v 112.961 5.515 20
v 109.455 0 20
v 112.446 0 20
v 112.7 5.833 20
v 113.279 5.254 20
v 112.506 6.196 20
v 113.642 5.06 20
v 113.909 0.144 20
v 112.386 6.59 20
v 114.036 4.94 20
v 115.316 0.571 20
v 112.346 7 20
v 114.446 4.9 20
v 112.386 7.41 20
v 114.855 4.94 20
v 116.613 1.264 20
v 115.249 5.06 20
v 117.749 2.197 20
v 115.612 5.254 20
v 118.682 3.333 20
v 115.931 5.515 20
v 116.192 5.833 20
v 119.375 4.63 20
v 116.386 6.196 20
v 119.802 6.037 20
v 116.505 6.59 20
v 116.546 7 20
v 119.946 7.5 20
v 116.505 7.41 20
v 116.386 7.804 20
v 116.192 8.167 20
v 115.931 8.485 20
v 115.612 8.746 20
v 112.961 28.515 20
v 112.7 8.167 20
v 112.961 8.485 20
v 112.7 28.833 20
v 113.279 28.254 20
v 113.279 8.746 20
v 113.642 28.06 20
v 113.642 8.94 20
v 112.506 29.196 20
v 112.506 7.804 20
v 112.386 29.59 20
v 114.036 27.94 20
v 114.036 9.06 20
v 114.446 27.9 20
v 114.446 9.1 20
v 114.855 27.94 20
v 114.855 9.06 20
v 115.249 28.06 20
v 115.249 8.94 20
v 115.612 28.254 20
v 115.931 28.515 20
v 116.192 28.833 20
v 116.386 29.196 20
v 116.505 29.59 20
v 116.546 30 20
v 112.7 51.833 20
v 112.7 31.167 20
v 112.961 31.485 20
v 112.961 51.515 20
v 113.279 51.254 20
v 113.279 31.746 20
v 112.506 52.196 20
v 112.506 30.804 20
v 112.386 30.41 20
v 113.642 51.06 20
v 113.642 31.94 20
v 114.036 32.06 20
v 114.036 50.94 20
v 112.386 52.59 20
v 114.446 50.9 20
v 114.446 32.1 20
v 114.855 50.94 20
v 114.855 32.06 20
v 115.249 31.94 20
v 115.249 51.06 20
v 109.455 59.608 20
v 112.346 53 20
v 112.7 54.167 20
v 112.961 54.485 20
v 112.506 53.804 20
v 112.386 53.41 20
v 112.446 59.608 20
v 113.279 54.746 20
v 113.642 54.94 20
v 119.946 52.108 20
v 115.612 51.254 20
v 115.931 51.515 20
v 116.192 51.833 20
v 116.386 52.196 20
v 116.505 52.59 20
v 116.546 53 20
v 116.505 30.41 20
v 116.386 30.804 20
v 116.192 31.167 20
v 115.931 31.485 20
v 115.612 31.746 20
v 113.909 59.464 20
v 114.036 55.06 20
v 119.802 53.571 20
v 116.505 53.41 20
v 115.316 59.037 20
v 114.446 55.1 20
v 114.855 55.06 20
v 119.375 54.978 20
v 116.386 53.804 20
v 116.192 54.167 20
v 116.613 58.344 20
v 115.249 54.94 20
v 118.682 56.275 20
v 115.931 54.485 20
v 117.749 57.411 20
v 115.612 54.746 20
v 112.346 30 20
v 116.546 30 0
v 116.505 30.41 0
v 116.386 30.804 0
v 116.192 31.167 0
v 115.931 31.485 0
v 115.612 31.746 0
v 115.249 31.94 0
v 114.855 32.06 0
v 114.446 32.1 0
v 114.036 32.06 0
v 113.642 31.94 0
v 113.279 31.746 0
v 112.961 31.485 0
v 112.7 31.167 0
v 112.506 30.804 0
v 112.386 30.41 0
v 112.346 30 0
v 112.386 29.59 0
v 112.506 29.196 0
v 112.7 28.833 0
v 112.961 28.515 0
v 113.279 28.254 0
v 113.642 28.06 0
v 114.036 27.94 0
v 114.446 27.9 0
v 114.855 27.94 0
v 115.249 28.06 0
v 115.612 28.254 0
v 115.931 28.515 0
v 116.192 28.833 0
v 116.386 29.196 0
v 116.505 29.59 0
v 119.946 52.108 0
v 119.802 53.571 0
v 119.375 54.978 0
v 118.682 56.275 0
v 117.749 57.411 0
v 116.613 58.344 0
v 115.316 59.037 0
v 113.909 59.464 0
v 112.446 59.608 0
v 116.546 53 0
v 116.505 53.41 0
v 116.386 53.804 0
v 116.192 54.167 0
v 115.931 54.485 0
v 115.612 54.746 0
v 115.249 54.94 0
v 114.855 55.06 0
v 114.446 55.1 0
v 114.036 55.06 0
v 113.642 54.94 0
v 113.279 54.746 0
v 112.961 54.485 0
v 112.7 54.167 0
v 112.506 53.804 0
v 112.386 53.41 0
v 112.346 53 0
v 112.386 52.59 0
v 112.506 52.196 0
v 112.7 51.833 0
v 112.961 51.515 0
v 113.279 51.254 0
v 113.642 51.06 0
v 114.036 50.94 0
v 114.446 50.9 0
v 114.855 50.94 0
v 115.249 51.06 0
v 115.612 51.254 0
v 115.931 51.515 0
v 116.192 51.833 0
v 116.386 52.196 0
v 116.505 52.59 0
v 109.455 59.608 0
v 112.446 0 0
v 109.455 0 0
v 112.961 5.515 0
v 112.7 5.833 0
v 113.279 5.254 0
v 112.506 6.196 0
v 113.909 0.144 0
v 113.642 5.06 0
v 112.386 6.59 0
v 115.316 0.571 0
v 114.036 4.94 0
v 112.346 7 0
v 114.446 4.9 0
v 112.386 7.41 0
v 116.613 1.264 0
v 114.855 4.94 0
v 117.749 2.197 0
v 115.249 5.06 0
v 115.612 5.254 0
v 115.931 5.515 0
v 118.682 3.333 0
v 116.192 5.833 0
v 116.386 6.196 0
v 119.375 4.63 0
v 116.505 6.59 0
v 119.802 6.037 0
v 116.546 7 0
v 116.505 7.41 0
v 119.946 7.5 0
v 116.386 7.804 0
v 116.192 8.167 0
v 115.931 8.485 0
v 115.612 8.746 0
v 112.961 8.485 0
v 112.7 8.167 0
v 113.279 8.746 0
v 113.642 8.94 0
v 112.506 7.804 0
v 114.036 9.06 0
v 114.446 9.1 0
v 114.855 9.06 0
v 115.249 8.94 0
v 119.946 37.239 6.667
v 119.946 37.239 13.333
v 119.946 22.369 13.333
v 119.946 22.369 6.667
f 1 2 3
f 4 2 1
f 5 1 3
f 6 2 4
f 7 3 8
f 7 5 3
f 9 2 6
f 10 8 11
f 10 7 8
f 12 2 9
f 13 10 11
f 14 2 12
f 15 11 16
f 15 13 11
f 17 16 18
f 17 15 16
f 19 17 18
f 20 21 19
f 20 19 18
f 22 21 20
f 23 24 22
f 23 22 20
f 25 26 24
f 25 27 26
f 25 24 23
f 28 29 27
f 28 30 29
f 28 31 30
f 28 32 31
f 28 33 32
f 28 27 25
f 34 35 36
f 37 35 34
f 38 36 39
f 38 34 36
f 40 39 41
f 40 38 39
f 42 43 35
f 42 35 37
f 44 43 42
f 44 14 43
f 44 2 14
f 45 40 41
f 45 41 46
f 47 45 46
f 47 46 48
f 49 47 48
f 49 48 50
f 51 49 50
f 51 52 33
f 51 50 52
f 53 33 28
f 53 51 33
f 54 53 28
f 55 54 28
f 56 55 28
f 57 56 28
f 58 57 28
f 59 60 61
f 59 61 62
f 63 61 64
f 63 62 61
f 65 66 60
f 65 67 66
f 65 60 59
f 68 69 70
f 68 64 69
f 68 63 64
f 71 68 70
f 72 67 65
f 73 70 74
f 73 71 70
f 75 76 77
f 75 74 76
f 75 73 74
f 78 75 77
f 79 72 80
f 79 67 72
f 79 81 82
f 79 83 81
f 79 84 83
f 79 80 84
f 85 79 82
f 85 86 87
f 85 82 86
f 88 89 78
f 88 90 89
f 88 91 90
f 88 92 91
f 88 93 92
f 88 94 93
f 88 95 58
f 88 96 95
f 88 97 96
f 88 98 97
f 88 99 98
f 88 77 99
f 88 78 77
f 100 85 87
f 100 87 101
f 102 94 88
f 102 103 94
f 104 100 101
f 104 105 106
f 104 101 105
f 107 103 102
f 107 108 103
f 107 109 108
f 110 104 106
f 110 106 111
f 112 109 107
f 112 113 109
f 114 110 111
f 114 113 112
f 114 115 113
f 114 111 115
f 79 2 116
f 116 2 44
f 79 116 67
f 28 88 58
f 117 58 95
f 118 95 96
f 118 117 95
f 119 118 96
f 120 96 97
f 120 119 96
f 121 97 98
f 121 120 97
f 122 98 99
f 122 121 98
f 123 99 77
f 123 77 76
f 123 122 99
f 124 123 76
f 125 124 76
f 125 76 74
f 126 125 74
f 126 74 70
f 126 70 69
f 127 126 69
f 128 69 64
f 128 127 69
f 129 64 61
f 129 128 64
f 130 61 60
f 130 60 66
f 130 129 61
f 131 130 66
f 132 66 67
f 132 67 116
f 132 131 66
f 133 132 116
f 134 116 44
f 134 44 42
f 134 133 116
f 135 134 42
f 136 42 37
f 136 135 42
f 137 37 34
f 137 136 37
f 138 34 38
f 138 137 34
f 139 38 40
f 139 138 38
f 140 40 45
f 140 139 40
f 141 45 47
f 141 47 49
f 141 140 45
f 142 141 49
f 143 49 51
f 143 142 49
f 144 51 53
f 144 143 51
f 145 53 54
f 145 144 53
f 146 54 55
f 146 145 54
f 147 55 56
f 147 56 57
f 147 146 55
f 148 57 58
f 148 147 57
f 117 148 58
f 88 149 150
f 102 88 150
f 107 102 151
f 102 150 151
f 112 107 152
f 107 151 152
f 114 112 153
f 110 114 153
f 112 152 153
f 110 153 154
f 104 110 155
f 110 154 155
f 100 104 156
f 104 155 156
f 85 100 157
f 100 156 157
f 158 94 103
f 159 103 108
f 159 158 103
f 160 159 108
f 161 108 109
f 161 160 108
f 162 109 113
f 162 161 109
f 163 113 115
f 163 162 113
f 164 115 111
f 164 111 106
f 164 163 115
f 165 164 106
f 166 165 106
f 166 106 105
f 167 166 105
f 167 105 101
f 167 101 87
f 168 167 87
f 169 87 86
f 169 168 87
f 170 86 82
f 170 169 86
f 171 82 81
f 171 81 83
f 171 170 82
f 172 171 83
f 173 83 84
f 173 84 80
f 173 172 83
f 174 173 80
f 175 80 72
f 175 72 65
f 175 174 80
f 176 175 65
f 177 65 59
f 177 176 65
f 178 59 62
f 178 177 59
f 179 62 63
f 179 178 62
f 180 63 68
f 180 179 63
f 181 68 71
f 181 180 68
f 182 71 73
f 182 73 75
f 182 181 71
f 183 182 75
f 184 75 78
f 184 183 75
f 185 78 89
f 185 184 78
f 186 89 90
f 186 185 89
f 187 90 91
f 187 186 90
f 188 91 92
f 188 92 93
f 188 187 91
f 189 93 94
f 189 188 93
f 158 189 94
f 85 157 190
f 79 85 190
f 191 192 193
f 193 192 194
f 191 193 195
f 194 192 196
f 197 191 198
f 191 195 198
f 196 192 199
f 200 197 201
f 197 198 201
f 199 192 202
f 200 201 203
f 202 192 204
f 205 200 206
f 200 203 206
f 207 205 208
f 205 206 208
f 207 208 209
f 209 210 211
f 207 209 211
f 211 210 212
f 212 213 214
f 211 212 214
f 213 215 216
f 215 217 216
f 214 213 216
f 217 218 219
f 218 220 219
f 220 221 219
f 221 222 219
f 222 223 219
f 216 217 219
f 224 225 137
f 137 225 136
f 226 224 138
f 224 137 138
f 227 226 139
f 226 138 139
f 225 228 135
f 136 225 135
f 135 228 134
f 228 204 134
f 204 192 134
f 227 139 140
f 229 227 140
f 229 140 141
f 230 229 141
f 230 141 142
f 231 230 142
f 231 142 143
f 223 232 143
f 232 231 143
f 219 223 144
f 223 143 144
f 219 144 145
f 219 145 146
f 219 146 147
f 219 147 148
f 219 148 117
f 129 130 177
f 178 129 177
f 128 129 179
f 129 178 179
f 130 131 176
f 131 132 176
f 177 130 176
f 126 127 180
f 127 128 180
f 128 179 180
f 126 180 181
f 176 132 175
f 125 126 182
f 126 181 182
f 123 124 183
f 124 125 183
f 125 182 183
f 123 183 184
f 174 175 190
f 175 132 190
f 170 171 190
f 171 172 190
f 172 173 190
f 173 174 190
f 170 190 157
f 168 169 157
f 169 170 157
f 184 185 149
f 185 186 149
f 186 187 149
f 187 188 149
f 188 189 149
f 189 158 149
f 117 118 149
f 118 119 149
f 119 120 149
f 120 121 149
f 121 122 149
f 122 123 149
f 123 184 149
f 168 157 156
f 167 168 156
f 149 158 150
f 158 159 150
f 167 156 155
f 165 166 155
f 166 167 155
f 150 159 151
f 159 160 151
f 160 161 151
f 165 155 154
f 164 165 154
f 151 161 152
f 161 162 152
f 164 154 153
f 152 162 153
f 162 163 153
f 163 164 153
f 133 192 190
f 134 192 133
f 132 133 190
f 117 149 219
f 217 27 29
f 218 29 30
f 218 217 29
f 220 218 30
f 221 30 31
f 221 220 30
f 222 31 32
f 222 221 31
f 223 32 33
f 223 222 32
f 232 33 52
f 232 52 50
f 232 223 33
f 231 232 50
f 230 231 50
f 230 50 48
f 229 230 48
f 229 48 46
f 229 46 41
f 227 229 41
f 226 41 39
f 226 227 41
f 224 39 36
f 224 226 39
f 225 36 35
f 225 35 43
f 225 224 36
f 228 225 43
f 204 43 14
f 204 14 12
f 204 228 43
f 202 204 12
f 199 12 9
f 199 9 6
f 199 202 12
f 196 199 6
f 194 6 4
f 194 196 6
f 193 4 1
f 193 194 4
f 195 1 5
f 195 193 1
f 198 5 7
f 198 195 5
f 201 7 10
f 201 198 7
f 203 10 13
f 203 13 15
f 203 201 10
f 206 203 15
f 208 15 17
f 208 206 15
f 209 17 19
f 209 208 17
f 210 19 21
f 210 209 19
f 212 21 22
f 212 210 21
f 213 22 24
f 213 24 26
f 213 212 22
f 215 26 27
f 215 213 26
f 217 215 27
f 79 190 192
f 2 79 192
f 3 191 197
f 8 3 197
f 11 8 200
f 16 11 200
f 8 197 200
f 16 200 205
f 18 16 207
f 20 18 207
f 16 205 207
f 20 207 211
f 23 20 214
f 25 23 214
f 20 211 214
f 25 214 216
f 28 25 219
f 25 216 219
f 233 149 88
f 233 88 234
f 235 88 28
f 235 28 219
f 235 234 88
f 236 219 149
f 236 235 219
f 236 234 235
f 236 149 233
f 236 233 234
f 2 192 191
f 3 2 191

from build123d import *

# Parameters (mm, degrees)
F1_R     = 2.1
F2_DEPTH = 20


# Not quite as in the source:
# - ends of sketch curves that miss each other by under 0.0002 mm in the source are joined


with BuildPart() as f2:
    # F1 (on Top) → F2 (new body)
    with BuildSketch(Plane.XY):
        with BuildLine():
            Line((112.4458007812, 59.6080856323), (109.4554236891, 59.6080856323))
            Line((109.4554236891, 59.6080856323), (109.4554236891, 0))
            Line((109.4554236891, 0), (112.4458007812, 0))
            ThreePointArc((112.4458007812, 0), (117.7491016401, 2.1966991411), (119.9458007812, 7.5))
            add(Edge.make_bspline(
                [(119.9458007812, 52.1080865864), (119.9458007812, 37.238724391), (119.9458007812, 22.3693621955), (119.9458007812, 7.5)],
                knots=[0, 0, 0, 0, 1, 1, 1, 1], degree=3))
            ThreePointArc((119.9458007812, 52.1080865864), (117.7491016401, 57.4113864912), (112.4458007812, 59.6080856323))
        make_face()
        with Locations((114.4458007813, 6.9999980927)):
            Circle(F1_R, mode=Mode.SUBTRACT)
        with Locations((114.4458007813, 29.9999995232)):
            Circle(F1_R, mode=Mode.SUBTRACT)
        with Locations((114.4458007813, 52.9999995232)):
            Circle(F1_R, mode=Mode.SUBTRACT)
    extrude(amount=F2_DEPTH)


solid = f2.part
